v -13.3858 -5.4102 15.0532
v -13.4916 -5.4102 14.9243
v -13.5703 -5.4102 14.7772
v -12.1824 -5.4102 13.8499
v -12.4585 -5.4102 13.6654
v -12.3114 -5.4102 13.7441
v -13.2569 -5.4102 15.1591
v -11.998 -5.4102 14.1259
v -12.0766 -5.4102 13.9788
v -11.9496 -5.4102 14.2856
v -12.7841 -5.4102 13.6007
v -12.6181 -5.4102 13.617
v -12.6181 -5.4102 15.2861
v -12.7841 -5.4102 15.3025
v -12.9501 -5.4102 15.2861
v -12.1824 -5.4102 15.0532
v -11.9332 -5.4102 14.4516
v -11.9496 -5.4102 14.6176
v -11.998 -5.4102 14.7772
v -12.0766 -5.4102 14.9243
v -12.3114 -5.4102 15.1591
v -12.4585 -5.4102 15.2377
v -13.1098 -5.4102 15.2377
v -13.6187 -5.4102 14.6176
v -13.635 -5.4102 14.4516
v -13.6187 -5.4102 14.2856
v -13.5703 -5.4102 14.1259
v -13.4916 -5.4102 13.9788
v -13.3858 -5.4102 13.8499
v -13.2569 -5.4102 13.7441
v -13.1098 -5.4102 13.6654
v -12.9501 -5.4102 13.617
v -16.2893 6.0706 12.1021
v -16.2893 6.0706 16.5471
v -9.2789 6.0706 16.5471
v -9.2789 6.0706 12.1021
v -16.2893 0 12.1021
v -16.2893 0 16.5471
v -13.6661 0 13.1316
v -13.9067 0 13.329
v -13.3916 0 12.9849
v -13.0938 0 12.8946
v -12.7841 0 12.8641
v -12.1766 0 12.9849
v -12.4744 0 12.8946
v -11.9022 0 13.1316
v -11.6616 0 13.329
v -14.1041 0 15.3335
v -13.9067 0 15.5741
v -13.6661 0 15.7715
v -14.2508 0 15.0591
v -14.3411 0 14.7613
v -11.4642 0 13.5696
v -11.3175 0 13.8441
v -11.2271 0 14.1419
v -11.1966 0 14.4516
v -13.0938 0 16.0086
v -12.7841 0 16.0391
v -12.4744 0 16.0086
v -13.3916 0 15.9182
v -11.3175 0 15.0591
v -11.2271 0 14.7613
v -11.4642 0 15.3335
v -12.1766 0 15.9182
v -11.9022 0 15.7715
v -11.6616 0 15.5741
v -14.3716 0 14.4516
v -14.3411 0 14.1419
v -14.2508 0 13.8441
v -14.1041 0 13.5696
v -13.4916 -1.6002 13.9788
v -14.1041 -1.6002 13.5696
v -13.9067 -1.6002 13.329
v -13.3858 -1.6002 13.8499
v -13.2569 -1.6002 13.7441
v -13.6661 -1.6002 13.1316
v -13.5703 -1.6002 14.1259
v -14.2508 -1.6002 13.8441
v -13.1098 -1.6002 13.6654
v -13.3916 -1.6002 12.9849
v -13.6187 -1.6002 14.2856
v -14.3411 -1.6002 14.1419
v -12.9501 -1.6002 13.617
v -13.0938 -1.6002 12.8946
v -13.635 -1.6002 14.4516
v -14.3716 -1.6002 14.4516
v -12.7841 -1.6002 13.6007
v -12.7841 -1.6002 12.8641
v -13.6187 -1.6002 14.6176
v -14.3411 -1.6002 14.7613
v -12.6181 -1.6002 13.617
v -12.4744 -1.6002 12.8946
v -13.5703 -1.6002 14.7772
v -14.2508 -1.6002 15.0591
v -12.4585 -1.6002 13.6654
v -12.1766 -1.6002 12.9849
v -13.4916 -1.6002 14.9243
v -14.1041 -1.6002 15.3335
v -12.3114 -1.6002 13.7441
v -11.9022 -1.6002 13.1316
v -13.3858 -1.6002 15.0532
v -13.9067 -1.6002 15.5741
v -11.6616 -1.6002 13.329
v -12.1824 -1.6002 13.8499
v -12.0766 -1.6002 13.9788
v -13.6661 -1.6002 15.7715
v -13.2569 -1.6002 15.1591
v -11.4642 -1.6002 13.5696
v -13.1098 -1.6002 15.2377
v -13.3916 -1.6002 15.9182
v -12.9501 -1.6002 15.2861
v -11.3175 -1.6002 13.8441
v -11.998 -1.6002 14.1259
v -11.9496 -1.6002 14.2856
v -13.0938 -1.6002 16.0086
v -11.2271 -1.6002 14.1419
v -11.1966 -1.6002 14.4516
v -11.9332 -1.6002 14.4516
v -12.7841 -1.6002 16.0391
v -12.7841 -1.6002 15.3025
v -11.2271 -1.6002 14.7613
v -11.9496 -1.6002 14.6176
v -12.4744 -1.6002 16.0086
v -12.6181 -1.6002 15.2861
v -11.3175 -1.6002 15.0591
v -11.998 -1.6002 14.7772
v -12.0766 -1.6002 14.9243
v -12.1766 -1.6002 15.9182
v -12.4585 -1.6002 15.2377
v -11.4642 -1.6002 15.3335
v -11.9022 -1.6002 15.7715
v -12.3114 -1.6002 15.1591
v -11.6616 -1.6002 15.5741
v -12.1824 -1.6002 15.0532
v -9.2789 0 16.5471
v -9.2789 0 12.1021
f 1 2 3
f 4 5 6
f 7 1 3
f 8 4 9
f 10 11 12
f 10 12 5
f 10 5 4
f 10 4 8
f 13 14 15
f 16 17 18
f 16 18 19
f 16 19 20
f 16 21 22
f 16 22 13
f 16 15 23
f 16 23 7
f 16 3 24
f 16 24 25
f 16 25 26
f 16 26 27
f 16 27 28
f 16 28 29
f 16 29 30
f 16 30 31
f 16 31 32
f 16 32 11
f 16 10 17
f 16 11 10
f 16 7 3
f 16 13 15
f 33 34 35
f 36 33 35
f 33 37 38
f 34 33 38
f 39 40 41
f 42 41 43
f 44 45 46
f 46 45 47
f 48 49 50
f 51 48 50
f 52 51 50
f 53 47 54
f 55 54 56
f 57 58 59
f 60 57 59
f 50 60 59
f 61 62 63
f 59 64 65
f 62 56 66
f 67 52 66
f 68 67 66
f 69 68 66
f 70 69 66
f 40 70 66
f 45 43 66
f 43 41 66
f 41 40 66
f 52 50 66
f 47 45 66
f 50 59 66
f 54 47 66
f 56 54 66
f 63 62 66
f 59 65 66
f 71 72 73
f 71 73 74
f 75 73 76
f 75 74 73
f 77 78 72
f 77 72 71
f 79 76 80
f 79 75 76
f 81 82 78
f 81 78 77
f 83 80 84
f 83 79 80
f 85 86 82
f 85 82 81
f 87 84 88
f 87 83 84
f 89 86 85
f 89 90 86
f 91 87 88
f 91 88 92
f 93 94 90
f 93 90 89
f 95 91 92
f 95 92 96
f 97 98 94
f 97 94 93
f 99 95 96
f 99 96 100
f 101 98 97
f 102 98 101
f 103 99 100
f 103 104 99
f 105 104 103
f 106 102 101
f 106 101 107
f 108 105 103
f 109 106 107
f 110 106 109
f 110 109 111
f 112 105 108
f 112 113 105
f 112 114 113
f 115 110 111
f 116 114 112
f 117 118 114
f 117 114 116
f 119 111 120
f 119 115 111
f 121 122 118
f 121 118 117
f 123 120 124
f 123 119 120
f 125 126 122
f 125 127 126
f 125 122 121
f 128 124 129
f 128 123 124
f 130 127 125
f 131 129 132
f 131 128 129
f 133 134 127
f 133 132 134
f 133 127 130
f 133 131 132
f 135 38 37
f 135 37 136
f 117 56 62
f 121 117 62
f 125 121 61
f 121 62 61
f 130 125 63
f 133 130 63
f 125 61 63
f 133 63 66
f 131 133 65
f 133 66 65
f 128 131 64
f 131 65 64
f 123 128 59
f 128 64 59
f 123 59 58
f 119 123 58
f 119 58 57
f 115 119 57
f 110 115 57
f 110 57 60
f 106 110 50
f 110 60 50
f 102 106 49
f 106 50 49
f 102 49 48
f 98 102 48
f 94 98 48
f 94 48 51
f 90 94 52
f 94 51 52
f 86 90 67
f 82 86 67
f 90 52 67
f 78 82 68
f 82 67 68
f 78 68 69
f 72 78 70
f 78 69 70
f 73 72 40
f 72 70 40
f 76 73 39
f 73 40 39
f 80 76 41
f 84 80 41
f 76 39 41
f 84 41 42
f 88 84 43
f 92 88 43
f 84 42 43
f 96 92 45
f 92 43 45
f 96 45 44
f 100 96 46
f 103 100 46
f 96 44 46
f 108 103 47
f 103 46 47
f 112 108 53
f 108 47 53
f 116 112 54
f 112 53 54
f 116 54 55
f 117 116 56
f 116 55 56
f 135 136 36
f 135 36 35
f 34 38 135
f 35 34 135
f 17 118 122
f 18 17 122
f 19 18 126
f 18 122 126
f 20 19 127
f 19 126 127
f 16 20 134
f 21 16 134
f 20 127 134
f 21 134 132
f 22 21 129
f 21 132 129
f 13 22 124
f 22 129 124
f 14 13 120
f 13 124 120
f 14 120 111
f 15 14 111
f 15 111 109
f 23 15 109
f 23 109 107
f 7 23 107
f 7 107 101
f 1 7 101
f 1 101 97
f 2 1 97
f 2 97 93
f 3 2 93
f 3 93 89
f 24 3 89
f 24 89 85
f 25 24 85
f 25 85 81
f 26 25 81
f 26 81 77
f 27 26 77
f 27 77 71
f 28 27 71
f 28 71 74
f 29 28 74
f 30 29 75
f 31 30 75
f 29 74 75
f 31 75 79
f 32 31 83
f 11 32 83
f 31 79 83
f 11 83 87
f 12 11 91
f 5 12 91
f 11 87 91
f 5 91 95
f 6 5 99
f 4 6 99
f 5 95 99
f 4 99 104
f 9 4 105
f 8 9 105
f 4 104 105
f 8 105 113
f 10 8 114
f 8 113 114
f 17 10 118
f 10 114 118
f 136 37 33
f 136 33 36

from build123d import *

# Parameters (mm, degrees)
F0_R     = 0.8509
F1_DEPTH = 5.4102
F0_R_2   = 1.5875
F2_DEPTH = 1.6002
F0_W     = 7.0104
F0_H     = 4.445
F3_DEPTH = 6.0706


with BuildPart() as f1:
    # F0 (on Front) → F1 (new body)
    with BuildSketch(Plane.XZ):
        with Locations((-12.784125, 14.451561)):
            Circle(F0_R)
    extrude(amount=F1_DEPTH)

    # F0 (on Front) → F2 (join)
    with BuildSketch(Plane.XZ):
        with Locations((-12.784125, 14.451561)):
            Circle(F0_R_2)
        with Locations((-12.784125, 14.451561)):
            Circle(F0_R, mode=Mode.SUBTRACT)
    extrude(amount=F2_DEPTH)


with BuildPart() as f3:
    # F0 (on Front) → F3 (new body)
    with BuildSketch(Plane.XZ):
        with Locations((-12.784125, 14.324561)):
            Rectangle(F0_W, F0_H)
        with Locations((-12.784125, 14.451561)):
            Circle(F0_R_2, mode=Mode.SUBTRACT)
        with Locations((-12.784125, 14.451561)):
            Circle(F0_R_2)
        with Locations((-12.784125, 14.451561)):
            Circle(F0_R, mode=Mode.SUBTRACT)
        with Locations((-12.784125, 14.451561)):
            Circle(F0_R)
    extrude(amount=-F3_DEPTH)


solid = Compound([f1.part, f3.part])
